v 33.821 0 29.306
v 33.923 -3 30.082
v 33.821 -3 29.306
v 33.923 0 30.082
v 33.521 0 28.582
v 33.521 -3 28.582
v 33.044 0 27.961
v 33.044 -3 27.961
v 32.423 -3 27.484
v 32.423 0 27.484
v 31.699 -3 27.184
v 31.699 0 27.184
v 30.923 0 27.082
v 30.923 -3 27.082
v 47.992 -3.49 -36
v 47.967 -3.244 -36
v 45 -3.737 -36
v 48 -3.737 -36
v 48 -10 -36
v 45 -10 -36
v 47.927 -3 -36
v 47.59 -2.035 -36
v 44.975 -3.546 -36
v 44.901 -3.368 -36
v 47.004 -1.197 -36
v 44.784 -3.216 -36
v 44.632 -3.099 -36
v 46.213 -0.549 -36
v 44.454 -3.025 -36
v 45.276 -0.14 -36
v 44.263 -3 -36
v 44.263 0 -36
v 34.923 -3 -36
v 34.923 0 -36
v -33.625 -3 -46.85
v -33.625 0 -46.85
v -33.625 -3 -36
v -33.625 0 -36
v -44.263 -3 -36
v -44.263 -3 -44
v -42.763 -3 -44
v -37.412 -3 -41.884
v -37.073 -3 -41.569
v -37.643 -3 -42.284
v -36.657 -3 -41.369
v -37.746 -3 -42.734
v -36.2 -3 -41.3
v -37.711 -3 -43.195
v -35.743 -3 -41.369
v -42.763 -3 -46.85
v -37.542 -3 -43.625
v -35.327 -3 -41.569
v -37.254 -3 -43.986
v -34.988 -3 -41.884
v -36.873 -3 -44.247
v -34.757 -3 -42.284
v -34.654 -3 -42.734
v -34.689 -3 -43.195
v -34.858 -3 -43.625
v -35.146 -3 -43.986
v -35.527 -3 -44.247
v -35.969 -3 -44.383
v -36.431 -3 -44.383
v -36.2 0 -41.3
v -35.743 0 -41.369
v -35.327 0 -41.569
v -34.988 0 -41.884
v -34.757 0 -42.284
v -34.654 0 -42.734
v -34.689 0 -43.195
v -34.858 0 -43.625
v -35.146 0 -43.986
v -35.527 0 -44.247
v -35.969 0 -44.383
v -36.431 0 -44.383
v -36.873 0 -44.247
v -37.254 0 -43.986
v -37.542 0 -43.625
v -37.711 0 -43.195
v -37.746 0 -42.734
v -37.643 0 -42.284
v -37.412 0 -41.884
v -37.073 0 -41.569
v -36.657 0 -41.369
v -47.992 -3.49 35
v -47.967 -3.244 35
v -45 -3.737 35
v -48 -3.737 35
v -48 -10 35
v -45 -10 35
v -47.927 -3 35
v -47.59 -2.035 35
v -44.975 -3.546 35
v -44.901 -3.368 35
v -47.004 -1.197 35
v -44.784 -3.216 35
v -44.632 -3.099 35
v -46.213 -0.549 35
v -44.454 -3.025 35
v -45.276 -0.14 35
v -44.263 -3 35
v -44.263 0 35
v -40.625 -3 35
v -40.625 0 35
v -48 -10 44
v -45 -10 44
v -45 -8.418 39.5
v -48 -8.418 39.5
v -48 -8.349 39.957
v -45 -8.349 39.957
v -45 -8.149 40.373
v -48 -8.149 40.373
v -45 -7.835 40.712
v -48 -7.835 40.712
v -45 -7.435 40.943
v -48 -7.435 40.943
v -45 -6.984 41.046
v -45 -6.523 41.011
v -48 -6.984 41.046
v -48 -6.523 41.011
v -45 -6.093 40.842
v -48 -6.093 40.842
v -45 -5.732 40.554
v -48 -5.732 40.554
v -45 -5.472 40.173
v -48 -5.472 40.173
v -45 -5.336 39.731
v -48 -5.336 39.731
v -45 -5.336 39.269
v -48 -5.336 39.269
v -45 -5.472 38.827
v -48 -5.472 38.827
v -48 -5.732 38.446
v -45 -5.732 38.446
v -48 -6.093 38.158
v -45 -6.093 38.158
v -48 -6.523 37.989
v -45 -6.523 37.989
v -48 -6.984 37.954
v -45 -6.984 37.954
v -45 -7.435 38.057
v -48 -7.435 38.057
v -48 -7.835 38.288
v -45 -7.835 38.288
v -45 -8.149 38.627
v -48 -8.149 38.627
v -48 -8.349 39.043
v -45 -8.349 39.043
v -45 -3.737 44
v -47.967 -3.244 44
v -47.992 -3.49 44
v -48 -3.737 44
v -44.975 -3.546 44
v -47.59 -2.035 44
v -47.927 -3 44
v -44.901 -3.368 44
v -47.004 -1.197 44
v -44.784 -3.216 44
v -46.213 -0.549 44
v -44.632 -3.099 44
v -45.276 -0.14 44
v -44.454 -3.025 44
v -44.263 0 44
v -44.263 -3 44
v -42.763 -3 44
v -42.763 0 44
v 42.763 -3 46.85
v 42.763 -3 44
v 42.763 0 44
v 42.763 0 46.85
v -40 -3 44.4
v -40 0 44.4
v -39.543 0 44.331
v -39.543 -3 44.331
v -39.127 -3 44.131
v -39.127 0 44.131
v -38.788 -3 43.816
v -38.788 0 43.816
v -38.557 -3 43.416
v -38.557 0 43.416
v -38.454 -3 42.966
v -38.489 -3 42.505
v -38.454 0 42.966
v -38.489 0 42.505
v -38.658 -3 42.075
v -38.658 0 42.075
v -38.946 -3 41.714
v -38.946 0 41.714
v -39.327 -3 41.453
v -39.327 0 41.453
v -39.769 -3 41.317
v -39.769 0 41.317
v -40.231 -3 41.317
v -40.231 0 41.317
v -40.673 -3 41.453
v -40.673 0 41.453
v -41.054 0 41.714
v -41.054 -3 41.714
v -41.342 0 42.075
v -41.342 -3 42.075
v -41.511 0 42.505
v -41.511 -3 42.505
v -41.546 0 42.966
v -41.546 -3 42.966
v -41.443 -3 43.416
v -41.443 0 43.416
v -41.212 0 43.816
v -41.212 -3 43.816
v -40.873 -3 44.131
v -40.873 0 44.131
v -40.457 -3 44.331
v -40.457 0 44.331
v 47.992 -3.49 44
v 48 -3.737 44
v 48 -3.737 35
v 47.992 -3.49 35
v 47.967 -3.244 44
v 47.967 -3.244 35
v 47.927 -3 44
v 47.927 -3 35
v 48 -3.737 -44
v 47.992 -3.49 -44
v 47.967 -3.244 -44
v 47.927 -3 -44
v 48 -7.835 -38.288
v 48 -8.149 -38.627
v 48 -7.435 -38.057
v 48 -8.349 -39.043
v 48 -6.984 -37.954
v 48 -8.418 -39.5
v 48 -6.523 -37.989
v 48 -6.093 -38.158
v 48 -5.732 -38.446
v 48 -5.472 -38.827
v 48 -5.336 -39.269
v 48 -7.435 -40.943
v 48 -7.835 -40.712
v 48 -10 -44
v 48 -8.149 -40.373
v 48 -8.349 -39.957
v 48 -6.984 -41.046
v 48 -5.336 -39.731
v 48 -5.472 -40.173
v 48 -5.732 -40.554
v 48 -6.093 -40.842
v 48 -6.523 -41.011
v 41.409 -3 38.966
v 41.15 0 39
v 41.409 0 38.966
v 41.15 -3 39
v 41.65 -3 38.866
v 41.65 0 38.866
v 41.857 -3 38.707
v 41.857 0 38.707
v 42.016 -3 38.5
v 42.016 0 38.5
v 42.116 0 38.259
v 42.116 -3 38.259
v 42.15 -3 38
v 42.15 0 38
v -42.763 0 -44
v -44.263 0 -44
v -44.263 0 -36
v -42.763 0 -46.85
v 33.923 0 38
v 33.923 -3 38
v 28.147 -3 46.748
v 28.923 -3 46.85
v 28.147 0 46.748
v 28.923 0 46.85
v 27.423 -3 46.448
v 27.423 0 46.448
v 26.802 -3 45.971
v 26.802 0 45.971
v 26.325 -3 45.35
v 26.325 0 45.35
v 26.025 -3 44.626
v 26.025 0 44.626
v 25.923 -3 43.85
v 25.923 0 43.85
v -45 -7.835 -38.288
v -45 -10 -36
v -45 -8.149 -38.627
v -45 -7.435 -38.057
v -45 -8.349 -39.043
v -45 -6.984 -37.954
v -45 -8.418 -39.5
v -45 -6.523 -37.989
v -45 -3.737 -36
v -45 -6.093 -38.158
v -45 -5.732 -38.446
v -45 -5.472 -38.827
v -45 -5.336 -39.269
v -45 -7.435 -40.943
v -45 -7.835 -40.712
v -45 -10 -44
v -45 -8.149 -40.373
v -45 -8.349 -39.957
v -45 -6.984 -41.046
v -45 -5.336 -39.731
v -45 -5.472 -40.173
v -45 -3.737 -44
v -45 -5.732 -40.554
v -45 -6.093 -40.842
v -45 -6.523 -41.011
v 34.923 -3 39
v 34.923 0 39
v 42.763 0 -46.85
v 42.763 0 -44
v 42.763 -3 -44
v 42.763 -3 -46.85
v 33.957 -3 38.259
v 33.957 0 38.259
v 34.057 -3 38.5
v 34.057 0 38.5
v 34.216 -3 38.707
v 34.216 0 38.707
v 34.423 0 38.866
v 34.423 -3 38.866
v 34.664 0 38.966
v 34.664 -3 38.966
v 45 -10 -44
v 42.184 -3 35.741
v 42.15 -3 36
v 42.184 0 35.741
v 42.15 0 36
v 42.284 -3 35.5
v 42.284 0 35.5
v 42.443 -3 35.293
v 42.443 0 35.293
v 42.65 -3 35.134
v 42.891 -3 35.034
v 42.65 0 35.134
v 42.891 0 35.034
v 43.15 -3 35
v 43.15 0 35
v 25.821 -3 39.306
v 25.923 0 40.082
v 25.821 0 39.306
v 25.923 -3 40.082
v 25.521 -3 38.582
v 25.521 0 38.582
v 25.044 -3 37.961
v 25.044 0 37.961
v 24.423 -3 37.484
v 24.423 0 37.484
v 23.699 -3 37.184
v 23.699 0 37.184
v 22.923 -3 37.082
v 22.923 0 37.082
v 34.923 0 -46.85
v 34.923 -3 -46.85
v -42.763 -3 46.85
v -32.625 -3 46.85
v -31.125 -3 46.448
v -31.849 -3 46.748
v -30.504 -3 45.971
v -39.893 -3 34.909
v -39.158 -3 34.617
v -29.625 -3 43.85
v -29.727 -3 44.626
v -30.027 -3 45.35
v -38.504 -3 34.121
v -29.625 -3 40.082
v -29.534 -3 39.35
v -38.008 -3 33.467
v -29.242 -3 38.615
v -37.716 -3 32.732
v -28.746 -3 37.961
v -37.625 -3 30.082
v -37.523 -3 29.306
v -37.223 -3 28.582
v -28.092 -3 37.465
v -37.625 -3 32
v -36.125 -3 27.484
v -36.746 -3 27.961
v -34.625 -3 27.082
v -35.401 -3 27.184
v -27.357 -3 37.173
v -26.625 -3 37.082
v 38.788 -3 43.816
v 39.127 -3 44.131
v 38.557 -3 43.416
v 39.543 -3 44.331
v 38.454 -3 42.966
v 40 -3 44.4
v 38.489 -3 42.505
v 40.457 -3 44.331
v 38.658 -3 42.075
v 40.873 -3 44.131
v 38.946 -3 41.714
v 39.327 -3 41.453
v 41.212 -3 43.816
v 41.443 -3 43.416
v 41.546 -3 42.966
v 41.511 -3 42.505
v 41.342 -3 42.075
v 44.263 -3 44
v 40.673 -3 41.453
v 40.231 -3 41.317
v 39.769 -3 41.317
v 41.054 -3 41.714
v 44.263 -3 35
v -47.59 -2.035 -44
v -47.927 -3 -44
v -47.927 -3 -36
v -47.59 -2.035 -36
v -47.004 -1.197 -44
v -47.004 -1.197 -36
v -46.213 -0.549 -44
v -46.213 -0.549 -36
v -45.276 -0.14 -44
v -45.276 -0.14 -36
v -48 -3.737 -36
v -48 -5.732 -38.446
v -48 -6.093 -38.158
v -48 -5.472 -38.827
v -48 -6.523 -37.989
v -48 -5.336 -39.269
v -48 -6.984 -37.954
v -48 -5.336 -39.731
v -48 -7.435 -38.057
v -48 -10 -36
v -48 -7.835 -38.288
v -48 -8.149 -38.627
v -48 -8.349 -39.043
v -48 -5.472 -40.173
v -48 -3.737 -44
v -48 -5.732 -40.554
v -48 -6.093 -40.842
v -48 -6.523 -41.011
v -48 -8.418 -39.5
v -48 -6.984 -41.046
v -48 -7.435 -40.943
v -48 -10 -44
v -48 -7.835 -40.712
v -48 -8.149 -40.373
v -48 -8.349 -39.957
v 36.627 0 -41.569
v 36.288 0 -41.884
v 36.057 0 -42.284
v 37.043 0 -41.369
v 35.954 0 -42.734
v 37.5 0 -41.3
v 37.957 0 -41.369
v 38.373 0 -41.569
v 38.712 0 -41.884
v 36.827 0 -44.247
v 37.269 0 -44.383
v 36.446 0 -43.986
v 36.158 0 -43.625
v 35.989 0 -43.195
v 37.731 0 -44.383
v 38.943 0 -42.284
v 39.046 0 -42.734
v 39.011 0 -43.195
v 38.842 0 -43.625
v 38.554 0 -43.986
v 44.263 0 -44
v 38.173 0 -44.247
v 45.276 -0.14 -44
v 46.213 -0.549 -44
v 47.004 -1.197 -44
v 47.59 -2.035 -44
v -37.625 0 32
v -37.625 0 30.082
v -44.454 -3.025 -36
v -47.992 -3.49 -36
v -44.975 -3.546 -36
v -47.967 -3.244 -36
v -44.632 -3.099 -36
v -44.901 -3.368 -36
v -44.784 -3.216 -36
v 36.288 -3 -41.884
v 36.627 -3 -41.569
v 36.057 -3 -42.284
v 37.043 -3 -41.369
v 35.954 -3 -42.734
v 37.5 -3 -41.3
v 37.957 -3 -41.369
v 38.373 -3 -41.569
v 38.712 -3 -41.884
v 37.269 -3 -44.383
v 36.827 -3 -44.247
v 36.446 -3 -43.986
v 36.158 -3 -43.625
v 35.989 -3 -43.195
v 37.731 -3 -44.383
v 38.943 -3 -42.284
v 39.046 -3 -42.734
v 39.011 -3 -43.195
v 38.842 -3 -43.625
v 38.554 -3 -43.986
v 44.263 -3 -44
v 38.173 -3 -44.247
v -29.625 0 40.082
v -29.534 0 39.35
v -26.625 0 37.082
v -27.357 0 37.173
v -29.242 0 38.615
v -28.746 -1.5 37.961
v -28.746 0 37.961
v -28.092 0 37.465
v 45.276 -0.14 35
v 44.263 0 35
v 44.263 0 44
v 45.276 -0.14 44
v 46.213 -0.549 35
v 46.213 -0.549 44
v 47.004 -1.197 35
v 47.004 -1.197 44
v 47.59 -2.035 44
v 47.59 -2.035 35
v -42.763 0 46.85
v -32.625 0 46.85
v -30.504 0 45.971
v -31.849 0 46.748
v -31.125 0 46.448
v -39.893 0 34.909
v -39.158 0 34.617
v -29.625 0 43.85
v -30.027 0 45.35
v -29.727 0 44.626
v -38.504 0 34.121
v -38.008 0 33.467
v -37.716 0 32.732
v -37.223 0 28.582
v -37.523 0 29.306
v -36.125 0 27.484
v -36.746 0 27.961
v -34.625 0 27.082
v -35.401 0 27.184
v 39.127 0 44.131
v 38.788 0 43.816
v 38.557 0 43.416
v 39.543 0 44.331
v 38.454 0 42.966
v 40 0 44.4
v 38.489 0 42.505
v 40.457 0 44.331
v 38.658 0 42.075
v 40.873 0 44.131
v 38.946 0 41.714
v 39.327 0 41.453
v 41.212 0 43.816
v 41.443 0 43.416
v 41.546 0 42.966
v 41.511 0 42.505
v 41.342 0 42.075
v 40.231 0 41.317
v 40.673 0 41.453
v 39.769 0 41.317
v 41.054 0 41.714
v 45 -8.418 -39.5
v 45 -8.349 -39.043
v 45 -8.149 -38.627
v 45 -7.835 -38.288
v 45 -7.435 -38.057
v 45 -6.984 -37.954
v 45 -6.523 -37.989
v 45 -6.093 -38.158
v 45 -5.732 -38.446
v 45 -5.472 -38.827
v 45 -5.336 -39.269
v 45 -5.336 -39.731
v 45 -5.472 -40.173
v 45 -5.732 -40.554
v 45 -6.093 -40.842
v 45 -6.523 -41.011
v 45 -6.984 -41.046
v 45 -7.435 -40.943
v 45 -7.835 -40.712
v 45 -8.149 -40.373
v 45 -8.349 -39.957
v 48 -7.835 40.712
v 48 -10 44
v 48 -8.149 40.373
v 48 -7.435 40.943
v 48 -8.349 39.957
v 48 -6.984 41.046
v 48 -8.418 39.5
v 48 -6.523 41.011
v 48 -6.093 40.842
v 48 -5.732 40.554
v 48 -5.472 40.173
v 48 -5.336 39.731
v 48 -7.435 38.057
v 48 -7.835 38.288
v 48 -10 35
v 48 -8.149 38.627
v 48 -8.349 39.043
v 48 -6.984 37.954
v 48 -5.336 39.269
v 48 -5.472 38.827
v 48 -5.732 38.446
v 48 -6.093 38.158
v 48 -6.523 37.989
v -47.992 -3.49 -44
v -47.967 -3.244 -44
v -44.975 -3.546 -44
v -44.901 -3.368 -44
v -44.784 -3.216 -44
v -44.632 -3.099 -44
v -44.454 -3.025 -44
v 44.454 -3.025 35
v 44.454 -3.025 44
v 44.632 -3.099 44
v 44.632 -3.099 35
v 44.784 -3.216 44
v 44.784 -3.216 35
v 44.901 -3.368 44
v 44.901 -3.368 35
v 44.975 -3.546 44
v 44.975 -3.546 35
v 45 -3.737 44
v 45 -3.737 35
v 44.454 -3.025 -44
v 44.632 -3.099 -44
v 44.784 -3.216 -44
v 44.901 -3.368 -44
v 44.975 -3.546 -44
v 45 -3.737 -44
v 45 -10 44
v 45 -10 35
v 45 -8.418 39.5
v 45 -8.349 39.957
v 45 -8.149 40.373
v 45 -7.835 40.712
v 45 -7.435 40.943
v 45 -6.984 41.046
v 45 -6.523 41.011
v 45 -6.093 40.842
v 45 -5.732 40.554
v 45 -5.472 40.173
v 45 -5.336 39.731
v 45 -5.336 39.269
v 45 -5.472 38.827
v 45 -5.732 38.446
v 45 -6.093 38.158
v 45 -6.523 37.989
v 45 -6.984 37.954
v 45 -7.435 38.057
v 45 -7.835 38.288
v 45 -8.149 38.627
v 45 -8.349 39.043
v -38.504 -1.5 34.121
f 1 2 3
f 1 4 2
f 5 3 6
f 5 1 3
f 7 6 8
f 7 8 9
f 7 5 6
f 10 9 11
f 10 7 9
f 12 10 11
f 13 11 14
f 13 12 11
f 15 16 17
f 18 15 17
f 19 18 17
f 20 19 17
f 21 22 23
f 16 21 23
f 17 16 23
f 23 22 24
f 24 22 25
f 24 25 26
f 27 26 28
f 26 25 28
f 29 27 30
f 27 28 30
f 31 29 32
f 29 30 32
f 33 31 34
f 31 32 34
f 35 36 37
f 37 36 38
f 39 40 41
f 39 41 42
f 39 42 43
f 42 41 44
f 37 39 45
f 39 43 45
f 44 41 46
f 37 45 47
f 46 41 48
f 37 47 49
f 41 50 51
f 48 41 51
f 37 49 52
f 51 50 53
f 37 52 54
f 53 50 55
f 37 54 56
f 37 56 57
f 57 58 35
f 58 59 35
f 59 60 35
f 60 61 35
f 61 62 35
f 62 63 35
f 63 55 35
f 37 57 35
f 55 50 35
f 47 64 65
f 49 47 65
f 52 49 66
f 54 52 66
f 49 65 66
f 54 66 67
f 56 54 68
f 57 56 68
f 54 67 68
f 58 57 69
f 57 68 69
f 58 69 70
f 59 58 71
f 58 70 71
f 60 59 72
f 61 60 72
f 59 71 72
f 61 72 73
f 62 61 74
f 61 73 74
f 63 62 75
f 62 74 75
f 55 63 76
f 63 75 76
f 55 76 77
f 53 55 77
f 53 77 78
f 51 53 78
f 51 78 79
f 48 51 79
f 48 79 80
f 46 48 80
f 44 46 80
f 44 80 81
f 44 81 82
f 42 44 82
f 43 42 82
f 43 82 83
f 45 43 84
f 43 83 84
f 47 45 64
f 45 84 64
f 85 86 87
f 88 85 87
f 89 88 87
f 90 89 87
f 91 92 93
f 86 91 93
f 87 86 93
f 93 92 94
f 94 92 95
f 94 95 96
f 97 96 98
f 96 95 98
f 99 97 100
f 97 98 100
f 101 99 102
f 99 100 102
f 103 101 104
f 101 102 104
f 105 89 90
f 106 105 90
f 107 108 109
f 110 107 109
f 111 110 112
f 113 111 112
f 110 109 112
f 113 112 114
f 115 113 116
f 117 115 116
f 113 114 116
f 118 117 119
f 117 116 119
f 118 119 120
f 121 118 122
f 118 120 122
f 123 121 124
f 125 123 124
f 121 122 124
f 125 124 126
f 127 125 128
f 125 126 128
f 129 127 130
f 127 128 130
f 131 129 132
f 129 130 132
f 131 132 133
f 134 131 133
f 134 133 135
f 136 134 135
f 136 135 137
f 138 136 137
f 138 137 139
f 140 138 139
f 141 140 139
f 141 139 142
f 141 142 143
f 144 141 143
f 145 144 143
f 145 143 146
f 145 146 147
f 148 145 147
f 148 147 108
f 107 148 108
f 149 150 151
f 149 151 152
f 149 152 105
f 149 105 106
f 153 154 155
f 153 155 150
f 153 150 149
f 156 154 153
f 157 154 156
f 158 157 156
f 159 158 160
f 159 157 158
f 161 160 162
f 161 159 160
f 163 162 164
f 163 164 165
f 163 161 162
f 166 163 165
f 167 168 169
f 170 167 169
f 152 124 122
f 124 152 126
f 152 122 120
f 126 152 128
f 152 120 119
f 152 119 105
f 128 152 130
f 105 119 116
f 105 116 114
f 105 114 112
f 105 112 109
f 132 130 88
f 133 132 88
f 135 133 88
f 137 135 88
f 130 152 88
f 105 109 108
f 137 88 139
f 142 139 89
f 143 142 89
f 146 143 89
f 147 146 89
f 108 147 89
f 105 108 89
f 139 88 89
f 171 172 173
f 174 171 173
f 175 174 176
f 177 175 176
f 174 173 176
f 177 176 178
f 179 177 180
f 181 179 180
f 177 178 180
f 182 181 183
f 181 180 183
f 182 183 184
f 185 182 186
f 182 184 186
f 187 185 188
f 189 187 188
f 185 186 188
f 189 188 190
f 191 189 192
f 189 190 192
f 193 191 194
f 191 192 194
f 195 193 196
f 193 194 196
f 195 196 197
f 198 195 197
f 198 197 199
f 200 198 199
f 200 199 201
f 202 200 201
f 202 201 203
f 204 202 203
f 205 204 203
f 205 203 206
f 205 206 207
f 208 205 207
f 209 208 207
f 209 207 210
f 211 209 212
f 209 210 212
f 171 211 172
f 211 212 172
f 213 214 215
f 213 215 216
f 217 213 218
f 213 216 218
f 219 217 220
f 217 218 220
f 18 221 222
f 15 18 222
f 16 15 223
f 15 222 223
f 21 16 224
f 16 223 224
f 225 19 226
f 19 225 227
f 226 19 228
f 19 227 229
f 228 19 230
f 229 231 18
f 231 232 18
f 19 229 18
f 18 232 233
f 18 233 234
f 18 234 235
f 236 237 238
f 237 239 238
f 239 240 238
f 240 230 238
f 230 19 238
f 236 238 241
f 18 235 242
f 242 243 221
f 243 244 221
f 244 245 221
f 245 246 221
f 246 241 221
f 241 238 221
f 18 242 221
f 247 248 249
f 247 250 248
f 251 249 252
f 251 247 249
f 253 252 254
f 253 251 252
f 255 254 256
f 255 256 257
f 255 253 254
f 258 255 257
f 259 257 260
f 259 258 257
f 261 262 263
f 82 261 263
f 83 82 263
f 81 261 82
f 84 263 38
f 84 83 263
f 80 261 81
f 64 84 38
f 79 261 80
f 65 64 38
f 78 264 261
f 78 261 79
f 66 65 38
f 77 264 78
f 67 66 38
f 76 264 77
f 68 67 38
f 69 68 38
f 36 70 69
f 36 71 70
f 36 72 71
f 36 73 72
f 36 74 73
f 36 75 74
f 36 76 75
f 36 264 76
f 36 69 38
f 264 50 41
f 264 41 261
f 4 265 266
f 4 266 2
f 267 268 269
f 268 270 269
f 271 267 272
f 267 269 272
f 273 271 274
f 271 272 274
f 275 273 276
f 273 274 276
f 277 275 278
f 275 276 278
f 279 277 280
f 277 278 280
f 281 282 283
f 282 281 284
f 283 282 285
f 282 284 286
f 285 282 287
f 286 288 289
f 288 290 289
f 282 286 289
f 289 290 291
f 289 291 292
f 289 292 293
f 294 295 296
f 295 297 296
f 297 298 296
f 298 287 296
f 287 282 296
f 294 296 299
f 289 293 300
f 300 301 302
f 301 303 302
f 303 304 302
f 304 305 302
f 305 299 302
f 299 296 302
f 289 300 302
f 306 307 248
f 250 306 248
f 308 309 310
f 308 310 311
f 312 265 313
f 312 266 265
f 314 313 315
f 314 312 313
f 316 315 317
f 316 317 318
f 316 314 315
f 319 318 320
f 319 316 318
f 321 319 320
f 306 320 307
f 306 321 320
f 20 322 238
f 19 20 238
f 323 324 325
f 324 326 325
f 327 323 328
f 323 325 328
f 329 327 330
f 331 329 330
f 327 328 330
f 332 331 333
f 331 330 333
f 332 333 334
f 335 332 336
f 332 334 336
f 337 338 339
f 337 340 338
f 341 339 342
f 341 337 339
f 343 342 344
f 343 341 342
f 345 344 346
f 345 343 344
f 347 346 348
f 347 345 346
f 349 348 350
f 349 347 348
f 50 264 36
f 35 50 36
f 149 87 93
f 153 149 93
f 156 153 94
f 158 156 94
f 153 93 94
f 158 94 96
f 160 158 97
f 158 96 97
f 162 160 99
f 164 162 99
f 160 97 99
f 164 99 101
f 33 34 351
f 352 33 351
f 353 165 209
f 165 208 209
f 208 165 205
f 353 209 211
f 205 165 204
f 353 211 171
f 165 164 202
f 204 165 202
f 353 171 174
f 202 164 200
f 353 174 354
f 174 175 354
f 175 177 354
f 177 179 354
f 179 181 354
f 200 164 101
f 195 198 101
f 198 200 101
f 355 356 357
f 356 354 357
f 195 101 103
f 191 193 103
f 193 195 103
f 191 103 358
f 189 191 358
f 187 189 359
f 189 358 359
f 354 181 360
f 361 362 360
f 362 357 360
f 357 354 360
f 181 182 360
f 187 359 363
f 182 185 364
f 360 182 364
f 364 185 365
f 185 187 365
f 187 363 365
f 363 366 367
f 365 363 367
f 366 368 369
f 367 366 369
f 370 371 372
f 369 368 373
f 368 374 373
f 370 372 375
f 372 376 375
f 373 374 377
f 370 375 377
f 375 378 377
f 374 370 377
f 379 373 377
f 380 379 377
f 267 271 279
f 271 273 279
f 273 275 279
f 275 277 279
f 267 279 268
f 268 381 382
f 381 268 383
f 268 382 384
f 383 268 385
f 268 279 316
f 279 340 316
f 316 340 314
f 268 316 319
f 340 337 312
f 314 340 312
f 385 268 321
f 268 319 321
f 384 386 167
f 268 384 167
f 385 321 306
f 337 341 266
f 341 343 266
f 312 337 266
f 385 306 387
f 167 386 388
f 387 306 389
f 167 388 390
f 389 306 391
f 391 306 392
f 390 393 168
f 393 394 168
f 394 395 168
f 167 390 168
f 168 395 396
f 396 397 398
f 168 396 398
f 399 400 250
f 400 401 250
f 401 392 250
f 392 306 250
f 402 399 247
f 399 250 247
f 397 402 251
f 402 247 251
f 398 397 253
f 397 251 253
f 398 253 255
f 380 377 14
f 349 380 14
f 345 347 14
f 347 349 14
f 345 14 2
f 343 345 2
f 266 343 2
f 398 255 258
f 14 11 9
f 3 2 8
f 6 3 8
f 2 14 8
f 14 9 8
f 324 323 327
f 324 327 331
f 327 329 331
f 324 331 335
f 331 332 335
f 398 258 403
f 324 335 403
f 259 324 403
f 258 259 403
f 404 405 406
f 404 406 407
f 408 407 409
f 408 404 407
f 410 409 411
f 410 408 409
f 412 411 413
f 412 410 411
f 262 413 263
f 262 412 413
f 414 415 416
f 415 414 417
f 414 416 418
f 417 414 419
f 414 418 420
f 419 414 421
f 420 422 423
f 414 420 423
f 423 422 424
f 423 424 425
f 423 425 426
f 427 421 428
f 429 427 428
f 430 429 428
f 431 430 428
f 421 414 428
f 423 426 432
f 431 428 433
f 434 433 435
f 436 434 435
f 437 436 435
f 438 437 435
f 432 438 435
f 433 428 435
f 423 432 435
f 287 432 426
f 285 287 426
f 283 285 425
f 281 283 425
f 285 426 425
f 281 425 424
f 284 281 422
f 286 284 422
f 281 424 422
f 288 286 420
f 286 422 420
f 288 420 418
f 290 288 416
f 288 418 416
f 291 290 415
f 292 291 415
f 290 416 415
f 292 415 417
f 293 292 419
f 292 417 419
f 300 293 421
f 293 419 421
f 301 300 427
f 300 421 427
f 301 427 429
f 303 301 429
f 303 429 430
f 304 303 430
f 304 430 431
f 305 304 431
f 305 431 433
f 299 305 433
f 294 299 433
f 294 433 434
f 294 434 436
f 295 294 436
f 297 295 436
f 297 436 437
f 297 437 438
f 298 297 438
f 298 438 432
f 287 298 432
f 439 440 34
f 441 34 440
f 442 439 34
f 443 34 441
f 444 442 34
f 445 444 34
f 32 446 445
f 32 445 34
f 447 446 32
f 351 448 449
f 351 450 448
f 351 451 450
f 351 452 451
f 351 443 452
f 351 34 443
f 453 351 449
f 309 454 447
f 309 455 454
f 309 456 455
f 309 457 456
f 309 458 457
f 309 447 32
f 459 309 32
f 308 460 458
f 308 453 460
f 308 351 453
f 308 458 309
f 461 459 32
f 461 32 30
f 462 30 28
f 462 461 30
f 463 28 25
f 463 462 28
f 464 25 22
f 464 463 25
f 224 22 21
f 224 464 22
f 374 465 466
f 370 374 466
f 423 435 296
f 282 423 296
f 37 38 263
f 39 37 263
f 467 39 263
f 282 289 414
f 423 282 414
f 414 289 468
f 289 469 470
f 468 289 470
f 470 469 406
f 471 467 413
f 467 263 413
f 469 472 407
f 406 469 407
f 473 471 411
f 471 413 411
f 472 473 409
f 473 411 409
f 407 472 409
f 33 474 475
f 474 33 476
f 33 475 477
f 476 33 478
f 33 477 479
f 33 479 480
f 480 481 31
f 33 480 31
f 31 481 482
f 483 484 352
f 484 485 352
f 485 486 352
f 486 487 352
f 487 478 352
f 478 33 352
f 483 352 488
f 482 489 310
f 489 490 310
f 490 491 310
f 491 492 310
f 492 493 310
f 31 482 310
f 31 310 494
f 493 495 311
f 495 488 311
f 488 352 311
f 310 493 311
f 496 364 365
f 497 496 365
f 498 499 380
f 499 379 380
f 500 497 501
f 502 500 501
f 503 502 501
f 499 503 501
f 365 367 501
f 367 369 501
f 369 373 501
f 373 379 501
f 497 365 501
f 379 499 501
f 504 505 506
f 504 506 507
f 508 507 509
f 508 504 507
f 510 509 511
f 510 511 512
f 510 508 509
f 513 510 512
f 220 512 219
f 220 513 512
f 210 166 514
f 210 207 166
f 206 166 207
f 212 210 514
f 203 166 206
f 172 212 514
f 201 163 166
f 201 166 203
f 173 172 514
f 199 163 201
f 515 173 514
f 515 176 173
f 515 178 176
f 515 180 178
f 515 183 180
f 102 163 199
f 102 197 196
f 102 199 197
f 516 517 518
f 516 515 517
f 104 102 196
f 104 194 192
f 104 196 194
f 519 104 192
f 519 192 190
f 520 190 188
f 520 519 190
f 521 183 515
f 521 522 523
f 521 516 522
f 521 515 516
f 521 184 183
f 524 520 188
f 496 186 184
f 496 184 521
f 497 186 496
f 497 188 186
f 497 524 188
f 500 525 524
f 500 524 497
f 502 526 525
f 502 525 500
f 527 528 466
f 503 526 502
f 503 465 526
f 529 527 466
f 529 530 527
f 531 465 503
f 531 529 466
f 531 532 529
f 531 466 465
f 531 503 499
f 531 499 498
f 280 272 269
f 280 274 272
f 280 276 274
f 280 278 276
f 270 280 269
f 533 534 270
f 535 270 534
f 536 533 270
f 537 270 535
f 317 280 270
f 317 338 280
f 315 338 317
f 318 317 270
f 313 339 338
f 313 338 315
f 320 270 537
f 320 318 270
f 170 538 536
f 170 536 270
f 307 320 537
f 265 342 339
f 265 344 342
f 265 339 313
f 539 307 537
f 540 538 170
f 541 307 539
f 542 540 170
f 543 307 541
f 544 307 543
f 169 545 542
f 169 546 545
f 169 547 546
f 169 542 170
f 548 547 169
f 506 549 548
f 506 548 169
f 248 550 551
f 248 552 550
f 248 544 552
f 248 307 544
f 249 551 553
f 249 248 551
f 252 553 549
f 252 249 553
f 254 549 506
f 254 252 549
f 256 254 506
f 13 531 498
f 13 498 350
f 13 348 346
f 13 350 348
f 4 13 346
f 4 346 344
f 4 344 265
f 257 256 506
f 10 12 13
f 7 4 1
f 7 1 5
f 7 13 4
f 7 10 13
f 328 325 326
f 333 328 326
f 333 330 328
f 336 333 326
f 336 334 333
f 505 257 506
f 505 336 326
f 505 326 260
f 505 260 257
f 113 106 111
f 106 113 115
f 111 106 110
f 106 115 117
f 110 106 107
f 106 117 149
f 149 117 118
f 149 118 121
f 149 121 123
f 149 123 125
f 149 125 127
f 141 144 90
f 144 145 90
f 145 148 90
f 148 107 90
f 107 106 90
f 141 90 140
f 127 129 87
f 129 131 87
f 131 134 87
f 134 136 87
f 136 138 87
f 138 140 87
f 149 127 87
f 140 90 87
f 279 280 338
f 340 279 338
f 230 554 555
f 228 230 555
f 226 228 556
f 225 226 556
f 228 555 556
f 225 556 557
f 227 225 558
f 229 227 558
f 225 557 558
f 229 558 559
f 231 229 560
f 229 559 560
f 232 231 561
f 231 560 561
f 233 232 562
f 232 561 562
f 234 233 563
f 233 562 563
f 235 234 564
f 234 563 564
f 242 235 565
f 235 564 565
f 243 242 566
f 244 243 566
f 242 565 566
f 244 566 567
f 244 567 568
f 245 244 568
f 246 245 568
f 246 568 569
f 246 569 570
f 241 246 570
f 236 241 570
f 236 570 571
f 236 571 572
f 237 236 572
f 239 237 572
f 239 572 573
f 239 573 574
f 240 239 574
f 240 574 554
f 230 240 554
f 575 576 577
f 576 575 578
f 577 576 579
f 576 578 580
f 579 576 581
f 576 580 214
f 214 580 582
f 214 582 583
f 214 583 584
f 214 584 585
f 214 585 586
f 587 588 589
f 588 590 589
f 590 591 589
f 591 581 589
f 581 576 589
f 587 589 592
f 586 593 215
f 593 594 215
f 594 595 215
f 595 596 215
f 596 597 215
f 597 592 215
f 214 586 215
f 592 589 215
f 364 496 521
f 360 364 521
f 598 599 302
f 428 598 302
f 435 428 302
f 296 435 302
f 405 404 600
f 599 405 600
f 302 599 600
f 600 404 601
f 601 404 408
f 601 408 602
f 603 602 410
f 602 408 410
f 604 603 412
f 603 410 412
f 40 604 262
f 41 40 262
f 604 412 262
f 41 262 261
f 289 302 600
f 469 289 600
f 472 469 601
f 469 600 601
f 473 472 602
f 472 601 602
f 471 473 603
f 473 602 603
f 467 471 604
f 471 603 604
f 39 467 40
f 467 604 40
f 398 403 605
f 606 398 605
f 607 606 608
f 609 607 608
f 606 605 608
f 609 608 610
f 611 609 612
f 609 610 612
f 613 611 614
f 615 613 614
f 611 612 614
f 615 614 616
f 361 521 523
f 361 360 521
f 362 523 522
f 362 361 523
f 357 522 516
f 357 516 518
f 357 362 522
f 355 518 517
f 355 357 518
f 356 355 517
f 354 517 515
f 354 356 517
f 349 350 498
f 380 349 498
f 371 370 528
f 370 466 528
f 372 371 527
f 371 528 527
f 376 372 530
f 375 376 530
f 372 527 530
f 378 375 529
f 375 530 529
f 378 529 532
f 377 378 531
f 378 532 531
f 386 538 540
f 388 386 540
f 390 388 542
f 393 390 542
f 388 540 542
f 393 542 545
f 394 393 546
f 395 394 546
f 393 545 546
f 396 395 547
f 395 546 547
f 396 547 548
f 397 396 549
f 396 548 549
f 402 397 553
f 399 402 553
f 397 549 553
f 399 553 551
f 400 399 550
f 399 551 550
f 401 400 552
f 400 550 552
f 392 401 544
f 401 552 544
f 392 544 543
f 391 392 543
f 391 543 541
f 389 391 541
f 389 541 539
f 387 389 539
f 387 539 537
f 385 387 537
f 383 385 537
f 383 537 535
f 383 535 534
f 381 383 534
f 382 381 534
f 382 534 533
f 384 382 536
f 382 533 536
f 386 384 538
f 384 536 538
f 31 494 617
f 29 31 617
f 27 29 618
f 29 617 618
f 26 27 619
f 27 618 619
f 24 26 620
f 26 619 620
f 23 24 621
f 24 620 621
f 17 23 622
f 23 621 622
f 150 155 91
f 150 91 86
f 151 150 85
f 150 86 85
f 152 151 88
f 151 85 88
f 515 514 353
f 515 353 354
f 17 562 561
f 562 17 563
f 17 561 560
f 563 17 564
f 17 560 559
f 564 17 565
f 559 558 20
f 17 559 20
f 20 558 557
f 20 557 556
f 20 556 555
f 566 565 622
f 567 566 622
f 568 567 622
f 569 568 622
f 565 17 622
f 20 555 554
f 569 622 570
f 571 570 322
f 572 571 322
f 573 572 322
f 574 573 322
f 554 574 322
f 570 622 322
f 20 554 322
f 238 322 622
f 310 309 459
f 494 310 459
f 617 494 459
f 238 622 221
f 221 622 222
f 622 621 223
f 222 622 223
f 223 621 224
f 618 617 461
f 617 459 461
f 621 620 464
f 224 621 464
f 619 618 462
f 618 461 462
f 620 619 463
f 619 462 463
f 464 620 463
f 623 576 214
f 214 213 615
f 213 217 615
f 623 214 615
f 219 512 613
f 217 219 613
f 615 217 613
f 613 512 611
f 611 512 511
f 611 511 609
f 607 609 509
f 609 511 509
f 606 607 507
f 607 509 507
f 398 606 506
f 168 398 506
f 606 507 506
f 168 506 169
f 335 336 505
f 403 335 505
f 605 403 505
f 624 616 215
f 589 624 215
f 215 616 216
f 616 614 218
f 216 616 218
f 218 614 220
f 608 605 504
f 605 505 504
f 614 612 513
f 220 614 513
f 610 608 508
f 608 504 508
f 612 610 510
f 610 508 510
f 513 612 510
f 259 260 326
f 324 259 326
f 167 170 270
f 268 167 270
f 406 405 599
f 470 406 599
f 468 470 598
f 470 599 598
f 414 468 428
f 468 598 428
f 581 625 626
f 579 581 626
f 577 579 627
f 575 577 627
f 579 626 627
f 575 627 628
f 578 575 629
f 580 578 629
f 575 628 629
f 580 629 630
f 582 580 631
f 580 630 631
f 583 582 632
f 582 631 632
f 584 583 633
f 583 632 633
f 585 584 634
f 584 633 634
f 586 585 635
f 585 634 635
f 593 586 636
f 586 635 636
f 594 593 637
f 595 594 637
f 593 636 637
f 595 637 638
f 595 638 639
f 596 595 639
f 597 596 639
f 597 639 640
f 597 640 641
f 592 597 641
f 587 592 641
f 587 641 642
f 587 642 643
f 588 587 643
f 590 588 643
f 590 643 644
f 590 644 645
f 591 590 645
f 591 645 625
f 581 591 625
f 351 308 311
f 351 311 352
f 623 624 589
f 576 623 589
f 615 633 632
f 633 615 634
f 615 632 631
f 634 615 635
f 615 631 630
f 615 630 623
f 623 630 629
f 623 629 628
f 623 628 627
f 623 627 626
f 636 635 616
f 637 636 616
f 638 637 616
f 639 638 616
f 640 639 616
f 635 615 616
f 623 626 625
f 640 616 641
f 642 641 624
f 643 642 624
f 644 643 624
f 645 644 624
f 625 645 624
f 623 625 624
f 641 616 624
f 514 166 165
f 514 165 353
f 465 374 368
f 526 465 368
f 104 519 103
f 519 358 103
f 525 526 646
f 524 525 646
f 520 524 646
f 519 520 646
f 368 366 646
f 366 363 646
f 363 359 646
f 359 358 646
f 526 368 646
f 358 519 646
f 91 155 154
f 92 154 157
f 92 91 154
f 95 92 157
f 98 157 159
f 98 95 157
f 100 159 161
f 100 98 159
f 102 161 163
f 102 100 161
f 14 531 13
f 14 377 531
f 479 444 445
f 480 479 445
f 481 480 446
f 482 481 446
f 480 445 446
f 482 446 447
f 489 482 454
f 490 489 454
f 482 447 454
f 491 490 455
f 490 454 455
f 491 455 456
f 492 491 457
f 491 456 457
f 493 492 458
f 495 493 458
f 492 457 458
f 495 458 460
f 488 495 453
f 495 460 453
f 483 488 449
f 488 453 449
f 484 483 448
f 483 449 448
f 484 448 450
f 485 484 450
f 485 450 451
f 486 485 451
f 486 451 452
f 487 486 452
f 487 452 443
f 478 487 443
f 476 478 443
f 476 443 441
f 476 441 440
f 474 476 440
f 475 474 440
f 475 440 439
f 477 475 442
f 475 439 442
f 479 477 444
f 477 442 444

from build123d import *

# Parameters (mm, degrees)
SKETCH2_R                = 1.55
SKETCH2_W                = 53.846
SKETCH2_H                = 54.164
BASE_FLANGE1_DEPTH       = 3
VARFILLET1_START         = -3
VARFILLET1_DEPTH         = 3
VARFILLET2_START         = -3
VARFILLET2_DEPTH         = 3
EDGE_FLANGE1_START       = -44
EDGE_FLANGE1_DEPTH       = 88
EDGE_FLANGE1_START_2     = -45.5
EDGE_FLANGE1_2_OUTLINE_W = 1.2366
EDGE_FLANGE1_2_OUTLINE_H = 3
EDGE_FLANGE1_2_DEPTH     = 1.5
EDGE_FLANGE1_START_3     = 44
EDGE_FLANGE1_3_OUTLINE_W = 1.2366
EDGE_FLANGE1_3_OUTLINE_H = 3
EDGE_FLANGE1_3_DEPTH     = 1.5
EDGE_FLANGE1_4_DEPTH     = 9
EDGE_FLANGE1_START_4     = 35
EDGE_FLANGE1_5_DEPTH     = 9
CUT_EXTRUDE1_DEPTH       = 69.614867264
SKETCH20_R               = 1.55
CUT_EXTRUDE2_DEPTH       = 108.288967324
CUT_EXTRUDE3_DEPTH       = 68.815356
CUT_EXTRUDE3_DEPTH_BACK  = 68.815356
FILLET1_R                = 3
CUT_EXTRUDE4_DEPTH       = 68.815356
SKETCH29_W               = 8.227003602
SKETCH29_H               = 15.176745615
CUT_EXTRUDE5_DEPTH       = 68.815356
FILLET2_R                = 1
FILLET3_R                = 3


with BuildPart() as part:
    # Base-Flange1: sheet metal written as solids
    # Sketch2 → Base-Flange1 (new body)
    with BuildSketch(Plane(origin=(0, 0, 0), x_dir=(1, 0, 0), z_dir=(0, 1, 0))):
        Polygon((-29.625, 48), (-29.625, 37.082), (30.923, 37.082), (30.923, 48), (44, 48), (44, 44), (48, 44), (48, 35), (36.923, 35), (36.923, -35), (48, -35), (48, -44), (44, -44), (44, -48), (30.923, -48), (25.923, -48), (25.923, -37.082), (-29.625, -37.082), (-29.625, -48), (-44, -48), (-44, -44), (-48, -44), (-48, -35), (-37.625, -35), (-37.625, 35), (-48, 35), (-48, 44), (-44, 44), (-44, 48), align=None)
        with Locations(Location((-36.2, 42.85, 0), (0, 0, 270))):
            Circle(SKETCH2_R, mode=Mode.SUBTRACT)
        with Locations(Location((-40, -42.85, 0), (0, 0, 270))):
            Circle(SKETCH2_R, mode=Mode.SUBTRACT)
        with Locations(Location((40, -42.85, 0), (0, 0, 270))):
            Circle(SKETCH2_R, mode=Mode.SUBTRACT)
        with Locations(Location((37.5, 42.85, 0), (0, 0, 270))):
            Circle(SKETCH2_R, mode=Mode.SUBTRACT)
        Rectangle(SKETCH2_W, SKETCH2_H, mode=Mode.SUBTRACT)
    extrude(amount=-BASE_FLANGE1_DEPTH)

    # VarFillet1: read off the stored shape, not the designer's step
    # VarFillet1 outline → VarFillet1 (add)
    with BuildSketch(Plane(origin=(0, 0, 0), x_dir=(1, 0, 0), z_dir=(0, 1, 0)).offset(VARFILLET1_START)):
        with BuildLine():
            Line((30.923, 37.082), (30.923, 40.082))
            add(Edge.make_bspline(
                [(30.923, 40.082), (30.923, 37.082), (27.923, 37.082)],
                knots=[0, 0, 0, 1, 1, 1], degree=2, weights=[1, 0.707106781, 1]))
            Line((27.923, 37.082), (30.923, 37.082))
        make_face()
        with BuildLine():
            Line((36.923, 35), (36.923, 32))
            add(Edge.make_bspline(
                [(36.923, 32), (36.923, 35), (39.923, 35)],
                knots=[0, 0, 0, 1, 1, 1], degree=2, weights=[1, 0.707106781, 1]))
            Line((39.923, 35), (36.923, 35))
        make_face()
        with BuildLine():
            add(Edge.make_bspline(
                [(39.923, -35), (36.923, -35), (36.923, -32)],
                knots=[0, 0, 0, 1, 1, 1], degree=2, weights=[1, 0.707106781, 1]))
            Line((36.923, -32), (36.923, -35))
            Line((36.923, -35), (39.923, -35))
        make_face()
        with BuildLine():
            Line((-29.625, -37.082), (-29.625, -40.082))
            add(Edge.make_bspline(
                [(-29.625, -40.082), (-29.625, -37.082), (-26.625, -37.082)],
                knots=[0, 0, 0, 1, 1, 1], degree=2, weights=[1, 0.707106781, 1]))
            Line((-26.625, -37.082), (-29.625, -37.082))
        make_face()
    extrude(amount=VARFILLET1_DEPTH)

    # VarFillet2: read off the stored shape, not the designer's step
    # VarFillet2 outline → VarFillet2 (add)
    with BuildSketch(Plane(origin=(0, 0, 0), x_dir=(1, 0, 0), z_dir=(0, 1, 0)).offset(VARFILLET2_START)):
        with BuildLine():
            Line((26.923, -27.082), (26.923, -24.082))
            add(Edge.make_bspline(
                [(26.923, -24.082), (26.923, -27.082), (23.923, -27.082)],
                knots=[0, 0, 0, 1, 1, 1], degree=2, weights=[1, 0.707106781, 1]))
            Line((23.923, -27.082), (26.923, -27.082))
        make_face()
        with BuildLine():
            add(Edge.make_bspline(
                [(23.923, 27.082), (26.923, 27.082), (26.923, 24.082)],
                knots=[0, 0, 0, 1, 1, 1], degree=2, weights=[1, 0.707106781, 1]))
            Line((26.923, 24.082), (26.923, 27.082))
            Line((26.923, 27.082), (23.923, 27.082))
        make_face()
        with BuildLine():
            Line((-26.923, -27.082), (-23.923, -27.082))
            add(Edge.make_bspline(
                [(-23.923, -27.082), (-26.923, -27.082), (-26.923, -24.082)],
                knots=[0, 0, 0, 1, 1, 1], degree=2, weights=[1, 0.707106781, 1]))
            Line((-26.923, -24.082), (-26.923, -27.082))
        make_face()
        with BuildLine():
            add(Edge.make_bspline(
                [(-26.923, 24.082), (-26.923, 27.082), (-23.923, 27.082)],
                knots=[0, 0, 0, 1, 1, 1], degree=2, weights=[1, 0.707106781, 1]))
            Line((-23.923, 27.082), (-26.923, 27.082))
            Line((-26.923, 27.082), (-26.923, 24.082))
        make_face()
        with BuildLine():
            Line((-37.625, -35), (-37.625, -32))
            add(Edge.make_bspline(
                [(-37.625, -32), (-37.625, -35), (-40.625, -35)],
                knots=[0, 0, 0, 1, 1, 1], degree=2, weights=[1, 0.707106781, 1]))
            Line((-40.625, -35), (-37.625, -35))
        make_face()
        with BuildLine():
            add(Edge.make_bspline(
                [(-40.625, 35), (-37.625, 35), (-37.625, 32)],
                knots=[0, 0, 0, 1, 1, 1], degree=2, weights=[1, 0.707106781, 1]))
            Line((-37.625, 32), (-37.625, 35))
            Line((-37.625, 35), (-40.625, 35))
        make_face()
        with BuildLine():
            Line((-29.625, 37.082), (-26.625, 37.082))
            add(Edge.make_bspline(
                [(-26.625, 37.082), (-29.625, 37.082), (-29.625, 40.082)],
                knots=[0, 0, 0, 1, 1, 1], degree=2, weights=[1, 0.707106781, 1]))
            Line((-29.625, 40.082), (-29.625, 37.082))
        make_face()
    extrude(amount=VARFILLET2_DEPTH)

    # Edge-Flange1: read off the stored shape, not the designer's step
    # Edge-Flange1 outline → Edge-Flange1 (cut)
    with BuildSketch(Plane.XY.offset(EDGE_FLANGE1_START)):
        with BuildLine():
            ThreePointArc((-47.926677222, -3), (-46.630867001, -0.845704021), (-44.2634, 0))
            Line((-44.2634, 0), (-48, 0))
            Line((-48, 0), (-48, -3))
            Line((-48, -3), (-47.926677222, -3))
        make_face()
        with BuildLine():
            Line((48, 0), (44.2634, 0))
            ThreePointArc((44.2634, 0), (46.630867001, -0.845704021), (47.926677222, -3))
            Line((47.926677222, -3), (48, -3))
            Line((48, -3), (48, 0))
        make_face()
    extrude(amount=EDGE_FLANGE1_DEPTH, mode=Mode.SUBTRACT)

    # Edge-Flange1 2 outline → Edge-Flange1 2 (cut)
    with BuildSketch(Plane.XY.offset(EDGE_FLANGE1_START_2)):
        with Locations((-43.3817, -1.5)):
            Rectangle(EDGE_FLANGE1_2_OUTLINE_W, EDGE_FLANGE1_2_OUTLINE_H)
        with Locations((43.3817, -1.5)):
            Rectangle(EDGE_FLANGE1_2_OUTLINE_W, EDGE_FLANGE1_2_OUTLINE_H)
    extrude(amount=EDGE_FLANGE1_2_DEPTH, mode=Mode.SUBTRACT)

    # Edge-Flange1 3 outline → Edge-Flange1 3 (cut)
    with BuildSketch(Plane.XY.offset(EDGE_FLANGE1_START_3)):
        with Locations((-43.3817, -1.5)):
            Rectangle(EDGE_FLANGE1_3_OUTLINE_W, EDGE_FLANGE1_3_OUTLINE_H)
        with Locations((43.3817, -1.5)):
            Rectangle(EDGE_FLANGE1_3_OUTLINE_W, EDGE_FLANGE1_3_OUTLINE_H)
    extrude(amount=EDGE_FLANGE1_3_DEPTH, mode=Mode.SUBTRACT)

    # Edge-Flange1 4 outline → Edge-Flange1 4 (add)
    with BuildSketch(Plane.XY.offset(EDGE_FLANGE1_START)):
        with BuildLine():
            ThreePointArc((-45, -3.7366), (-44.784254855, -3.215745145), (-44.2634, -3))
            Line((-44.2634, -3), (-47.926677222, -3))
            ThreePointArc((-47.926677222, -3), (-47.981624121, -3.36647982), (-48, -3.7366))
            Line((-48, -3.7366), (-48, -10))
            Line((-48, -10), (-45, -10))
            Line((-45, -10), (-45, -3.7366))
        make_face()
        with BuildLine():
            Line((47.926677222, -3), (44.2634, -3))
            ThreePointArc((44.2634, -3), (44.784254855, -3.215745145), (45, -3.7366))
            Line((45, -3.7366), (45, -10))
            Line((45, -10), (48, -10))
            Line((48, -10), (48, -3.7366))
            ThreePointArc((48, -3.7366), (47.981624121, -3.36647982), (47.926677222, -3))
        make_face()
    extrude(amount=EDGE_FLANGE1_4_DEPTH)

    # Edge-Flange1 5 outline → Edge-Flange1 5 (add)
    with BuildSketch(Plane.XY.offset(EDGE_FLANGE1_START_4)):
        with BuildLine():
            ThreePointArc((-45, -3.7366), (-44.784254855, -3.215745145), (-44.2634, -3))
            Line((-44.2634, -3), (-47.926677222, -3))
            ThreePointArc((-47.926677222, -3), (-47.981624121, -3.36647982), (-48, -3.7366))
            Line((-48, -3.7366), (-48, -10))
            Line((-48, -10), (-45, -10))
            Line((-45, -10), (-45, -3.7366))
        make_face()
        with BuildLine():
            Line((47.926677222, -3), (44.2634, -3))
            ThreePointArc((44.2634, -3), (44.784254855, -3.215745145), (45, -3.7366))
            Line((45, -3.7366), (45, -10))
            Line((45, -10), (48, -10))
            Line((48, -10), (48, -3.7366))
            ThreePointArc((48, -3.7366), (47.981624121, -3.36647982), (47.926677222, -3))
        make_face()
    extrude(amount=EDGE_FLANGE1_5_DEPTH)

    # Sketch19 → Cut-Extrude1 (cut, through all)
    with BuildSketch(Plane(origin=(0, 0, 0), x_dir=(1, 0, 0), z_dir=(0, 1, 0))):
        Polygon((-42.7634, 45.5), (-42.7634, 46.85), (-29.625, 46.85), (-29.625, 48), (-44, 48), (-44, 45.5), align=None)
        Polygon((44, 45.5), (42.7634, 45.5), (42.7634, 46.85), (29.625, 46.85), (29.625, 48), (44, 48), align=None)
        Polygon((42.7634, -45.5), (42.7634, -46.85), (24.798845721, -46.85), (24.798845721, -48), (44, -48), (44, -45.5), align=None)
        Polygon((-44, -45.5), (-42.7634, -45.5), (-42.7634, -46.85), (-29.625, -46.85), (-29.625, -48), (-44, -48), align=None)
    extrude(amount=-CUT_EXTRUDE1_DEPTH, mode=Mode.SUBTRACT)

    # Sketch20 → Cut-Extrude2 (cut, through all)
    with BuildSketch(Plane.ZY.offset(48)):
        with Locations(Location((-39.5, -6.8683, 0), (0, 0, 270))):
            Circle(SKETCH20_R)
        with Locations(Location((39.5, -6.8683, 0), (0, 0, 270))):
            Circle(SKETCH20_R)
    extrude(amount=-CUT_EXTRUDE2_DEPTH, mode=Mode.SUBTRACT)

    # Sketch21 → Cut-Extrude3 (cut, two sides: drawn at the far end of the back side and taken through both)
    with BuildSketch(Plane(origin=(0, 0, 0), x_dir=(1, 0, 0), z_dir=(0, 1, 0)).offset(-CUT_EXTRUDE3_DEPTH_BACK)):
        Polygon((36.923, -27.082), (-37.625, -27.082), (-71.217622097, -27.082), (-71.217622097, 35), (-32.625, 35), (-32.625, 50), (33.923, 50), (33.923, 35), (65.560700491, 35), (65.560700491, -21.509199751), align=None)
    extrude(amount=CUT_EXTRUDE3_DEPTH + CUT_EXTRUDE3_DEPTH_BACK, mode=Mode.SUBTRACT)


with BuildPart() as cut_extrude3_piece_1:
    # of the separate pieces the step leaves, piece 1, a body of its own (cut_extrude3_pieces)
    add(part.part.solids().sort_by_distance((-37.625, 0, 32))[0])

    # Fillet1
    fillet1_edges = [cut_extrude3_piece_1.edges().sort_by_distance(p)[0] for p in [
        (36.923, -1.5, 27.082),
        (-37.625, -1.5, 27.082),
        (-29.625, -1.5, 46.85),
    ]]
    fillet(fillet1_edges, radius=FILLET1_R)

    # Sketch29 → Cut-Extrude5 (cut, through all)
    with BuildSketch(Plane(origin=(0, 0, 0), x_dir=(1, 0, 0), z_dir=(0, 1, 0))):
        with Locations((38.036501801, -31.411627192)):
            Rectangle(SKETCH29_W, SKETCH29_H)
    extrude(amount=-CUT_EXTRUDE5_DEPTH, mode=Mode.SUBTRACT)

    # Fillet2
    fillet2_edges = [cut_extrude3_piece_1.edges().sort_by_distance(p)[0] for p in [
        (42.150003602, -1.5, 35),
        (33.923, -1.5, 39),
        (42.150003602, -1.5, 39),
    ]]
    fillet(fillet2_edges, radius=FILLET2_R)

    # Fillet3
    fillet3_edges = [cut_extrude3_piece_1.edges().sort_by_distance(p)[0] for p in [
        (25.923, -1.5, 46.85),
        (33.923, -1.5, 27.082),
        (25.923, -1.5, 37.082),
    ]]
    fillet(fillet3_edges, radius=FILLET3_R)


with BuildPart() as cut_extrude3_piece_2:
    # of the separate pieces the step leaves, piece 2, a body of its own (cut_extrude3_pieces)
    add(part.part.solids().sort_by_distance((-42.7634, 0, -44))[0])


with BuildPart() as cut_extrude3_piece_3:
    # of the separate pieces the step leaves, piece 3, a body of its own (cut_extrude3_pieces)
    add(part.part.solids().sort_by_distance((33.923, 0, -46.85))[0])


with BuildPart() as cut_extrude4_tool:
    # Sketch28 → Cut-Extrude4 (new, through all)
    with BuildSketch(Plane(origin=(0, 0, 0), x_dir=(1, 0, 0), z_dir=(0, 1, 0))):
        Polygon((-44.2634, 36), (-33.625, 36), (-33.625, 46.85), (-33.625, 50.132362052), (34.923, 50.132362052), (34.923, 46.85), (34.923, 36), (44.2634, 36), (57.549667037, 36), (57.549667037, 25.658972996), (-51.756960045, 25.658972996), (-51.756960045, 36), align=None)
    extrude(amount=-CUT_EXTRUDE4_DEPTH)


with BuildPart() as cut_extrude3_piece_2_1:
    add(cut_extrude3_piece_2.part)

    # Cut-Extrude4: cut by cut_extrude4_tool
    add(cut_extrude4_tool.part, mode=Mode.SUBTRACT)


with BuildPart() as cut_extrude3_piece_3_1:
    add(cut_extrude3_piece_3.part)

    # Cut-Extrude4: cut by cut_extrude4_tool
    add(cut_extrude4_tool.part, mode=Mode.SUBTRACT)


solid = Compound([cut_extrude3_piece_1.part, cut_extrude3_piece_2_1.part, cut_extrude3_piece_3_1.part])
